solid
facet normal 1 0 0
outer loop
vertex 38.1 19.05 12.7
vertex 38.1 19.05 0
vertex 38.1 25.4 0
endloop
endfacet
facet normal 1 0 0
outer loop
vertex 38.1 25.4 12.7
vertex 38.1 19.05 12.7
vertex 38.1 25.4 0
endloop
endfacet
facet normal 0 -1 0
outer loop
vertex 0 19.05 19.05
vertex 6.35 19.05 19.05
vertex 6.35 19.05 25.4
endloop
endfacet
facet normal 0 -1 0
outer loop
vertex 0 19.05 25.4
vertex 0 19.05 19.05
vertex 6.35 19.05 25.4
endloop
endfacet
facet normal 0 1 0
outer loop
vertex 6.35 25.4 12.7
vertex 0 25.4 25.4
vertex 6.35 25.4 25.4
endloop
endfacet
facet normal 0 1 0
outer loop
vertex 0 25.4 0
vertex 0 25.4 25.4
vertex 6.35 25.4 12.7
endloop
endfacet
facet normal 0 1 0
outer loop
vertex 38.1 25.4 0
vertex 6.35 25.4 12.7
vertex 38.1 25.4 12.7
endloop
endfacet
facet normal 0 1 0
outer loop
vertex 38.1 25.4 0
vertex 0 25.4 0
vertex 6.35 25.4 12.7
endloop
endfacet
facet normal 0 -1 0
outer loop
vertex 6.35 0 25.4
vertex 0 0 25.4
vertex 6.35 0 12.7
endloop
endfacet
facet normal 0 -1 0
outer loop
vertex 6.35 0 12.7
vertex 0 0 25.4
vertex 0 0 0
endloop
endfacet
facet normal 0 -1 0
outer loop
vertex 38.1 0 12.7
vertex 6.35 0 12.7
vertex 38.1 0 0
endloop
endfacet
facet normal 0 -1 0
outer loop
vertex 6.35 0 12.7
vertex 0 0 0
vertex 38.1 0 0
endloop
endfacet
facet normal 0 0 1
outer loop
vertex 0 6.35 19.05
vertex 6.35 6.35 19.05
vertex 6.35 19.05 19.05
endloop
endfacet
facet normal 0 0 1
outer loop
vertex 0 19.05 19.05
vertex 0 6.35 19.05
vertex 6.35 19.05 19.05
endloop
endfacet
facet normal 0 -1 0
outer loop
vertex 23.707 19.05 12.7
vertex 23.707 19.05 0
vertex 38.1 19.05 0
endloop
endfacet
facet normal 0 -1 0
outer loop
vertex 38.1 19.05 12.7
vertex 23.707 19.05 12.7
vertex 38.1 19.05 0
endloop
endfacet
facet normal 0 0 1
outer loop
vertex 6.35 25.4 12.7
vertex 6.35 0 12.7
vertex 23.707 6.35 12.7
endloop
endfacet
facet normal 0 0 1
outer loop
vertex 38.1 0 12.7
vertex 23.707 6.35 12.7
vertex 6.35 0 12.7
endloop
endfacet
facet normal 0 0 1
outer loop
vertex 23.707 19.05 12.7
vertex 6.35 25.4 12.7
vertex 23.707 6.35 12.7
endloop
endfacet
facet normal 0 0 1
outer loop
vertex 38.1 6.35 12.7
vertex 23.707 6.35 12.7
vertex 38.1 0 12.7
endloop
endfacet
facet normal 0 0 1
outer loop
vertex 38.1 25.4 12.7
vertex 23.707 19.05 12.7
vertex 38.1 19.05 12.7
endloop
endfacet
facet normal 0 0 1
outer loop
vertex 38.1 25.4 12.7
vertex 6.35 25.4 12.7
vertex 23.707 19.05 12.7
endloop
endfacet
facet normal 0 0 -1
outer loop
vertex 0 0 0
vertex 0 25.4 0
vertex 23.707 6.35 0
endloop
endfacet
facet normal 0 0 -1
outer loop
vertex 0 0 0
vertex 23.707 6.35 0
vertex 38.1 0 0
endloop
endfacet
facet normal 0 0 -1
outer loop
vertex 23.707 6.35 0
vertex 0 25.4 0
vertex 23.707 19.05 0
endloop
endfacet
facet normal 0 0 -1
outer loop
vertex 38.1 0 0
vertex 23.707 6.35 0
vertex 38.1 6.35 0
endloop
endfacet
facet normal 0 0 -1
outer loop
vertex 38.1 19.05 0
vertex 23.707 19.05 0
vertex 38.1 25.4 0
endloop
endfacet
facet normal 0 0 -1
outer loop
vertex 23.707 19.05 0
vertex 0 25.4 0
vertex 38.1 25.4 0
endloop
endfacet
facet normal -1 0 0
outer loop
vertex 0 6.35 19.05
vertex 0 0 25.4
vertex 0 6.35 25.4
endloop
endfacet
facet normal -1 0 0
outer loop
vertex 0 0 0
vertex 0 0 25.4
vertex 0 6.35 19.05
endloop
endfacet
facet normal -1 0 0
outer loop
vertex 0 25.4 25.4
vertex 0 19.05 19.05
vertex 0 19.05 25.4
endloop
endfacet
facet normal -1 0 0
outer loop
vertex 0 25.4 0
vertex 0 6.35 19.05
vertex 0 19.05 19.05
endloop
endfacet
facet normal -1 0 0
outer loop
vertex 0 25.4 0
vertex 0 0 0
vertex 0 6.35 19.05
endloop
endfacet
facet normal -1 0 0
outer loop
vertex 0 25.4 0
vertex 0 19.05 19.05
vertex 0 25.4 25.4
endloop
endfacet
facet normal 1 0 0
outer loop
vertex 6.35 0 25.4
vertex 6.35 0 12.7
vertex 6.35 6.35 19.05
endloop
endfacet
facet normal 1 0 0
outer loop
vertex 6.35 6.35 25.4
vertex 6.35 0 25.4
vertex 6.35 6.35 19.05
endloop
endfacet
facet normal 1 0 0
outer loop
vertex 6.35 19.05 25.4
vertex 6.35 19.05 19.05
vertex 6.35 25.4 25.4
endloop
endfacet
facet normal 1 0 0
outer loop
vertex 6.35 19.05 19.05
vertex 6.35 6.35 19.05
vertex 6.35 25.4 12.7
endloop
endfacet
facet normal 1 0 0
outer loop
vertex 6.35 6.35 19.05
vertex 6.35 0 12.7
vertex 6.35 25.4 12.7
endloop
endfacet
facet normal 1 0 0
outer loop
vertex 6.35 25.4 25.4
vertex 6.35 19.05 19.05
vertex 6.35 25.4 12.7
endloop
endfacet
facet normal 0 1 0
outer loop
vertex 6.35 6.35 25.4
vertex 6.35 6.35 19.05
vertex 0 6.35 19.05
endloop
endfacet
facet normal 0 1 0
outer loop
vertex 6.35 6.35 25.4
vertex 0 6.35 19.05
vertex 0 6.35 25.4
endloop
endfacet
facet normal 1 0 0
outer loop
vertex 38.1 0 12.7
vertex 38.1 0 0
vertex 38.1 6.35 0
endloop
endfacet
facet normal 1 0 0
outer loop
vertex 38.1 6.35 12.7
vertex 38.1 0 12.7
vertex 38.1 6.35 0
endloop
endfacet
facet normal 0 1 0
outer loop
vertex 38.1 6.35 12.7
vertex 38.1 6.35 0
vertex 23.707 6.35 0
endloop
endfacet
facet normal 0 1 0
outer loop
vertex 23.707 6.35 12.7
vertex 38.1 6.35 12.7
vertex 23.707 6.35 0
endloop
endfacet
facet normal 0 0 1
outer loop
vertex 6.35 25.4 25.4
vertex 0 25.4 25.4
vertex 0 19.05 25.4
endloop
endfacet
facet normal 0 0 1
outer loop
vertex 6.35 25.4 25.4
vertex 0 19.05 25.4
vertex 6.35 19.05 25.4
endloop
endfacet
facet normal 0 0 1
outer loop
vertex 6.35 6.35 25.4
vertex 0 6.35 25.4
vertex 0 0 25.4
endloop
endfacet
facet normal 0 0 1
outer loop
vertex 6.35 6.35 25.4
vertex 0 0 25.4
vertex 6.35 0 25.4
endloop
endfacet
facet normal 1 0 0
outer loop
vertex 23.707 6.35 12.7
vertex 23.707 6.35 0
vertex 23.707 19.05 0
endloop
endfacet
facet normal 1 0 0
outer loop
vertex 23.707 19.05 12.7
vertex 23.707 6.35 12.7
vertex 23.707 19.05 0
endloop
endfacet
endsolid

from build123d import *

# Parameters (mm, degrees)
F1_DEPTH = 12.7
F2_W     = 6.35
F2_H     = 25.4
F3_DEPTH = 12.7
F4_W     = 12.7
F4_H     = 6.35
F5_DEPTH = 25.4


with BuildPart() as f1:
    # F0 (on Top) → F1 (new body)
    with BuildSketch(Plane.XY):
        Polygon((0, 25.4), (0, 0), (38.1, 0), (38.1, 6.35), (23.706993, 6.35), (23.706993, 19.05), (38.1, 19.05), (38.1, 25.4), align=None)
    extrude(amount=F1_DEPTH)

    # F2 (on face) → F3 (join)
    with BuildSketch(Plane.XY.offset(12.7)):
        with Locations((3.175, 12.7)):
            Rectangle(F2_W, F2_H)
    extrude(amount=F3_DEPTH)

    # F4 (on face) → F5 (cut)
    with BuildSketch(Plane.YZ.offset(6.35)):
        with Locations((12.7, 22.225)):
            Rectangle(F4_W, F4_H)
    extrude(amount=-F5_DEPTH, mode=Mode.SUBTRACT)


solid = f1.part
